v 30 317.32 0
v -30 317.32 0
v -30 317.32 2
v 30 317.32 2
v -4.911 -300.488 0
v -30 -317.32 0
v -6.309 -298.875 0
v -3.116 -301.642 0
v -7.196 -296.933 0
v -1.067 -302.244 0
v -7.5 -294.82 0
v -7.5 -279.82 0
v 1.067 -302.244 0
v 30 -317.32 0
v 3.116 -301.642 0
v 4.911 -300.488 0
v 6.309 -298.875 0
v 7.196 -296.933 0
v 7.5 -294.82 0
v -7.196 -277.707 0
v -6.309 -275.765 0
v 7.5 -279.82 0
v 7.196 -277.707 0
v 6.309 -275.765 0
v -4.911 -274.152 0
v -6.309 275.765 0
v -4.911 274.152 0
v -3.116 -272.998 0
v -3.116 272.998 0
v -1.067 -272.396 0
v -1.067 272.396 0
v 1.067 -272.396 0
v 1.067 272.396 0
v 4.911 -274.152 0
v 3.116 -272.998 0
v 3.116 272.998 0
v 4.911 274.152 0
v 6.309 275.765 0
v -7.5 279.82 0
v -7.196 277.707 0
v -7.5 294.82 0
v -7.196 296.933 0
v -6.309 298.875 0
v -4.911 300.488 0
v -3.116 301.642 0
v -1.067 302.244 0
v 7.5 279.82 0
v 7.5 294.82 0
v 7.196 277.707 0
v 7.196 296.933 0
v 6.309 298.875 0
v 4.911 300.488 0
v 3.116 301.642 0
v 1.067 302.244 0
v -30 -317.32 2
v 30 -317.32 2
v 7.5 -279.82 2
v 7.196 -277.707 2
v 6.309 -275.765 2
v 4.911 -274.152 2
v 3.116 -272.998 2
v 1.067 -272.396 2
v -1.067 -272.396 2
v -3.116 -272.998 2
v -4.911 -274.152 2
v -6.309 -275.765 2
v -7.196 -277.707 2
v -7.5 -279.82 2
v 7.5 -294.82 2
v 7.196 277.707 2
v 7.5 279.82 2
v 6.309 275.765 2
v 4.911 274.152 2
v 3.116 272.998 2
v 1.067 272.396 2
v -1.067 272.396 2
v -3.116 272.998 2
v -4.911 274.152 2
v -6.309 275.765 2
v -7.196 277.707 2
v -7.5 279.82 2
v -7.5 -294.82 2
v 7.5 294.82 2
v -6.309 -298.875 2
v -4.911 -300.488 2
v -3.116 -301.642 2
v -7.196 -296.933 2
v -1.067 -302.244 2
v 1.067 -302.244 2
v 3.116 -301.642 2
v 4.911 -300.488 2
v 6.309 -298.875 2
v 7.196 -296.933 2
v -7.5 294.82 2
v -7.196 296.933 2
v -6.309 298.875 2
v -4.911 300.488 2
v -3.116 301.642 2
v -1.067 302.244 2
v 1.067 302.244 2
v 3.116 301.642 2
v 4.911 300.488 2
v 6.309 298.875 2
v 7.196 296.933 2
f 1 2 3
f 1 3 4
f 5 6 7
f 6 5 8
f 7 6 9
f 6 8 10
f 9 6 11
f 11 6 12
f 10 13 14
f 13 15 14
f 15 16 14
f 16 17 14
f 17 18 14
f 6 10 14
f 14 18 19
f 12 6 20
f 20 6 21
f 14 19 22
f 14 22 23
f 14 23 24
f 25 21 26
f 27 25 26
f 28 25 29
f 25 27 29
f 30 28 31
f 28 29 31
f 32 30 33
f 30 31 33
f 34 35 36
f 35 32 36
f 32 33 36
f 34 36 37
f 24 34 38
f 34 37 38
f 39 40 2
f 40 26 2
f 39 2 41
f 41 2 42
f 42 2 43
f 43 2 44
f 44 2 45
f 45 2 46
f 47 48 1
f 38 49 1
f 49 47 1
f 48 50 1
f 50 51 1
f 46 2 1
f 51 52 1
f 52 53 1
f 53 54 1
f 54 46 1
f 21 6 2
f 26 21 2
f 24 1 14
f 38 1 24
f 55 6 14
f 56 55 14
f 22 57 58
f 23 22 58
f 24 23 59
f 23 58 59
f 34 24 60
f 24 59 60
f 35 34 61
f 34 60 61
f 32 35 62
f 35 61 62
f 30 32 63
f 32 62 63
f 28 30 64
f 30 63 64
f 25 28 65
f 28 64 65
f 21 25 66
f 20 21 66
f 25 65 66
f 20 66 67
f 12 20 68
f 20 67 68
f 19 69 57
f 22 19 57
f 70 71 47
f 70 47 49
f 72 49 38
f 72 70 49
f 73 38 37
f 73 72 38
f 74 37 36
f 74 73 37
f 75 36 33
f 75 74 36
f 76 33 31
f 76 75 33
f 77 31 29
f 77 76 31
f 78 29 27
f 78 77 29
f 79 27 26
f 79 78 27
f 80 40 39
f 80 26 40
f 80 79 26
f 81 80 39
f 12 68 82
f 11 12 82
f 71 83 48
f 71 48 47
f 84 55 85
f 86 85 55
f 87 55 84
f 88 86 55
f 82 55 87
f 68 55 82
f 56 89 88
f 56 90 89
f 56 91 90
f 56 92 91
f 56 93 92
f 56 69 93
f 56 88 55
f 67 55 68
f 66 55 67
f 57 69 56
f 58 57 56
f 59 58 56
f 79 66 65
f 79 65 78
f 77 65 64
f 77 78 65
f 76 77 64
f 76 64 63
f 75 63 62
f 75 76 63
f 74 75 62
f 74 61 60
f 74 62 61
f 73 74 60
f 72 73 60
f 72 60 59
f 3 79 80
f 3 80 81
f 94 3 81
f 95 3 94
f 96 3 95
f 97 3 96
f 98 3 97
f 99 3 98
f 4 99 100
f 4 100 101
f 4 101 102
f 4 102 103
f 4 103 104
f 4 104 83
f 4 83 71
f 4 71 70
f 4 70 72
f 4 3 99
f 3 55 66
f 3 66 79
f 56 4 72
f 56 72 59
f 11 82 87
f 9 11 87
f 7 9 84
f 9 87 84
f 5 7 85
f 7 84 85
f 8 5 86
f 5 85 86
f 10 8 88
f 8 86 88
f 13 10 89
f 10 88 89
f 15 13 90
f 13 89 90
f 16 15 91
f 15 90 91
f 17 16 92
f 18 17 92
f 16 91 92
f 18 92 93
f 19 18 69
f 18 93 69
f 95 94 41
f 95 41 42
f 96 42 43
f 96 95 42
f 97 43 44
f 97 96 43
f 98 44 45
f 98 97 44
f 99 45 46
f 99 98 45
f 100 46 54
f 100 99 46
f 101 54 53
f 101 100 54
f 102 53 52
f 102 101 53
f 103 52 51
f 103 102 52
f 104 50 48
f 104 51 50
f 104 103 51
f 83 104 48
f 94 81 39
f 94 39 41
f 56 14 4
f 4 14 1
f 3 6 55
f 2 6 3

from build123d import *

# Parameters (mm, degrees)
SKETCH1_W           = 60
SKETCH1_H           = 634.64
BOSS_EXTRUDE1_DEPTH = 2
CUT_EXTRUDE1_REACH  = 320.741


with BuildPart() as part:
    # Sketch1 → Boss-Extrude1 (new body)
    with BuildSketch(Plane.XY):
        Rectangle(SKETCH1_W, SKETCH1_H)
    extrude(amount=BOSS_EXTRUDE1_DEPTH)

    # Sketch2 → Cut-Extrude1 (cut, up to next)
    with BuildSketch(Plane.XY.offset(2), mode=Mode.PRIVATE) as cut_extrude1_sk1:
        with BuildLine():
            Line((7.5, 294.82), (7.5, 279.82))
            ThreePointArc((7.5, 279.82), (0, 272.32), (-7.5, 279.82))
            Line((-7.5, 279.82), (-7.5, 294.82))
            ThreePointArc((-7.5, 294.82), (0, 302.32), (7.5, 294.82))
        make_face()
    cut_extrude1_tool1 = extrude(cut_extrude1_sk1.sketch, amount=-CUT_EXTRUDE1_REACH, mode=Mode.PRIVATE) & part.part
    # Sketch2 → Cut-Extrude1 (cut, up to next)
    with BuildSketch(Plane.XY.offset(2), mode=Mode.PRIVATE) as cut_extrude1_sk2:
        with BuildLine():
            Line((7.5, -294.82), (7.5, -279.82))
            ThreePointArc((7.5, -279.82), (0, -272.32), (-7.5, -279.82))
            Line((-7.5, -279.82), (-7.5, -294.82))
            ThreePointArc((-7.5, -294.82), (0, -302.32), (7.5, -294.82))
        make_face()
    cut_extrude1_tool2 = extrude(cut_extrude1_sk2.sketch, amount=-CUT_EXTRUDE1_REACH, mode=Mode.PRIVATE) & part.part
    add(cut_extrude1_tool1.solids().sort_by_distance((0, 287.32, 2))[0], mode=Mode.SUBTRACT)
    add(cut_extrude1_tool2.solids().sort_by_distance((0, -287.32, 2))[0], mode=Mode.SUBTRACT)


solid = part.part
